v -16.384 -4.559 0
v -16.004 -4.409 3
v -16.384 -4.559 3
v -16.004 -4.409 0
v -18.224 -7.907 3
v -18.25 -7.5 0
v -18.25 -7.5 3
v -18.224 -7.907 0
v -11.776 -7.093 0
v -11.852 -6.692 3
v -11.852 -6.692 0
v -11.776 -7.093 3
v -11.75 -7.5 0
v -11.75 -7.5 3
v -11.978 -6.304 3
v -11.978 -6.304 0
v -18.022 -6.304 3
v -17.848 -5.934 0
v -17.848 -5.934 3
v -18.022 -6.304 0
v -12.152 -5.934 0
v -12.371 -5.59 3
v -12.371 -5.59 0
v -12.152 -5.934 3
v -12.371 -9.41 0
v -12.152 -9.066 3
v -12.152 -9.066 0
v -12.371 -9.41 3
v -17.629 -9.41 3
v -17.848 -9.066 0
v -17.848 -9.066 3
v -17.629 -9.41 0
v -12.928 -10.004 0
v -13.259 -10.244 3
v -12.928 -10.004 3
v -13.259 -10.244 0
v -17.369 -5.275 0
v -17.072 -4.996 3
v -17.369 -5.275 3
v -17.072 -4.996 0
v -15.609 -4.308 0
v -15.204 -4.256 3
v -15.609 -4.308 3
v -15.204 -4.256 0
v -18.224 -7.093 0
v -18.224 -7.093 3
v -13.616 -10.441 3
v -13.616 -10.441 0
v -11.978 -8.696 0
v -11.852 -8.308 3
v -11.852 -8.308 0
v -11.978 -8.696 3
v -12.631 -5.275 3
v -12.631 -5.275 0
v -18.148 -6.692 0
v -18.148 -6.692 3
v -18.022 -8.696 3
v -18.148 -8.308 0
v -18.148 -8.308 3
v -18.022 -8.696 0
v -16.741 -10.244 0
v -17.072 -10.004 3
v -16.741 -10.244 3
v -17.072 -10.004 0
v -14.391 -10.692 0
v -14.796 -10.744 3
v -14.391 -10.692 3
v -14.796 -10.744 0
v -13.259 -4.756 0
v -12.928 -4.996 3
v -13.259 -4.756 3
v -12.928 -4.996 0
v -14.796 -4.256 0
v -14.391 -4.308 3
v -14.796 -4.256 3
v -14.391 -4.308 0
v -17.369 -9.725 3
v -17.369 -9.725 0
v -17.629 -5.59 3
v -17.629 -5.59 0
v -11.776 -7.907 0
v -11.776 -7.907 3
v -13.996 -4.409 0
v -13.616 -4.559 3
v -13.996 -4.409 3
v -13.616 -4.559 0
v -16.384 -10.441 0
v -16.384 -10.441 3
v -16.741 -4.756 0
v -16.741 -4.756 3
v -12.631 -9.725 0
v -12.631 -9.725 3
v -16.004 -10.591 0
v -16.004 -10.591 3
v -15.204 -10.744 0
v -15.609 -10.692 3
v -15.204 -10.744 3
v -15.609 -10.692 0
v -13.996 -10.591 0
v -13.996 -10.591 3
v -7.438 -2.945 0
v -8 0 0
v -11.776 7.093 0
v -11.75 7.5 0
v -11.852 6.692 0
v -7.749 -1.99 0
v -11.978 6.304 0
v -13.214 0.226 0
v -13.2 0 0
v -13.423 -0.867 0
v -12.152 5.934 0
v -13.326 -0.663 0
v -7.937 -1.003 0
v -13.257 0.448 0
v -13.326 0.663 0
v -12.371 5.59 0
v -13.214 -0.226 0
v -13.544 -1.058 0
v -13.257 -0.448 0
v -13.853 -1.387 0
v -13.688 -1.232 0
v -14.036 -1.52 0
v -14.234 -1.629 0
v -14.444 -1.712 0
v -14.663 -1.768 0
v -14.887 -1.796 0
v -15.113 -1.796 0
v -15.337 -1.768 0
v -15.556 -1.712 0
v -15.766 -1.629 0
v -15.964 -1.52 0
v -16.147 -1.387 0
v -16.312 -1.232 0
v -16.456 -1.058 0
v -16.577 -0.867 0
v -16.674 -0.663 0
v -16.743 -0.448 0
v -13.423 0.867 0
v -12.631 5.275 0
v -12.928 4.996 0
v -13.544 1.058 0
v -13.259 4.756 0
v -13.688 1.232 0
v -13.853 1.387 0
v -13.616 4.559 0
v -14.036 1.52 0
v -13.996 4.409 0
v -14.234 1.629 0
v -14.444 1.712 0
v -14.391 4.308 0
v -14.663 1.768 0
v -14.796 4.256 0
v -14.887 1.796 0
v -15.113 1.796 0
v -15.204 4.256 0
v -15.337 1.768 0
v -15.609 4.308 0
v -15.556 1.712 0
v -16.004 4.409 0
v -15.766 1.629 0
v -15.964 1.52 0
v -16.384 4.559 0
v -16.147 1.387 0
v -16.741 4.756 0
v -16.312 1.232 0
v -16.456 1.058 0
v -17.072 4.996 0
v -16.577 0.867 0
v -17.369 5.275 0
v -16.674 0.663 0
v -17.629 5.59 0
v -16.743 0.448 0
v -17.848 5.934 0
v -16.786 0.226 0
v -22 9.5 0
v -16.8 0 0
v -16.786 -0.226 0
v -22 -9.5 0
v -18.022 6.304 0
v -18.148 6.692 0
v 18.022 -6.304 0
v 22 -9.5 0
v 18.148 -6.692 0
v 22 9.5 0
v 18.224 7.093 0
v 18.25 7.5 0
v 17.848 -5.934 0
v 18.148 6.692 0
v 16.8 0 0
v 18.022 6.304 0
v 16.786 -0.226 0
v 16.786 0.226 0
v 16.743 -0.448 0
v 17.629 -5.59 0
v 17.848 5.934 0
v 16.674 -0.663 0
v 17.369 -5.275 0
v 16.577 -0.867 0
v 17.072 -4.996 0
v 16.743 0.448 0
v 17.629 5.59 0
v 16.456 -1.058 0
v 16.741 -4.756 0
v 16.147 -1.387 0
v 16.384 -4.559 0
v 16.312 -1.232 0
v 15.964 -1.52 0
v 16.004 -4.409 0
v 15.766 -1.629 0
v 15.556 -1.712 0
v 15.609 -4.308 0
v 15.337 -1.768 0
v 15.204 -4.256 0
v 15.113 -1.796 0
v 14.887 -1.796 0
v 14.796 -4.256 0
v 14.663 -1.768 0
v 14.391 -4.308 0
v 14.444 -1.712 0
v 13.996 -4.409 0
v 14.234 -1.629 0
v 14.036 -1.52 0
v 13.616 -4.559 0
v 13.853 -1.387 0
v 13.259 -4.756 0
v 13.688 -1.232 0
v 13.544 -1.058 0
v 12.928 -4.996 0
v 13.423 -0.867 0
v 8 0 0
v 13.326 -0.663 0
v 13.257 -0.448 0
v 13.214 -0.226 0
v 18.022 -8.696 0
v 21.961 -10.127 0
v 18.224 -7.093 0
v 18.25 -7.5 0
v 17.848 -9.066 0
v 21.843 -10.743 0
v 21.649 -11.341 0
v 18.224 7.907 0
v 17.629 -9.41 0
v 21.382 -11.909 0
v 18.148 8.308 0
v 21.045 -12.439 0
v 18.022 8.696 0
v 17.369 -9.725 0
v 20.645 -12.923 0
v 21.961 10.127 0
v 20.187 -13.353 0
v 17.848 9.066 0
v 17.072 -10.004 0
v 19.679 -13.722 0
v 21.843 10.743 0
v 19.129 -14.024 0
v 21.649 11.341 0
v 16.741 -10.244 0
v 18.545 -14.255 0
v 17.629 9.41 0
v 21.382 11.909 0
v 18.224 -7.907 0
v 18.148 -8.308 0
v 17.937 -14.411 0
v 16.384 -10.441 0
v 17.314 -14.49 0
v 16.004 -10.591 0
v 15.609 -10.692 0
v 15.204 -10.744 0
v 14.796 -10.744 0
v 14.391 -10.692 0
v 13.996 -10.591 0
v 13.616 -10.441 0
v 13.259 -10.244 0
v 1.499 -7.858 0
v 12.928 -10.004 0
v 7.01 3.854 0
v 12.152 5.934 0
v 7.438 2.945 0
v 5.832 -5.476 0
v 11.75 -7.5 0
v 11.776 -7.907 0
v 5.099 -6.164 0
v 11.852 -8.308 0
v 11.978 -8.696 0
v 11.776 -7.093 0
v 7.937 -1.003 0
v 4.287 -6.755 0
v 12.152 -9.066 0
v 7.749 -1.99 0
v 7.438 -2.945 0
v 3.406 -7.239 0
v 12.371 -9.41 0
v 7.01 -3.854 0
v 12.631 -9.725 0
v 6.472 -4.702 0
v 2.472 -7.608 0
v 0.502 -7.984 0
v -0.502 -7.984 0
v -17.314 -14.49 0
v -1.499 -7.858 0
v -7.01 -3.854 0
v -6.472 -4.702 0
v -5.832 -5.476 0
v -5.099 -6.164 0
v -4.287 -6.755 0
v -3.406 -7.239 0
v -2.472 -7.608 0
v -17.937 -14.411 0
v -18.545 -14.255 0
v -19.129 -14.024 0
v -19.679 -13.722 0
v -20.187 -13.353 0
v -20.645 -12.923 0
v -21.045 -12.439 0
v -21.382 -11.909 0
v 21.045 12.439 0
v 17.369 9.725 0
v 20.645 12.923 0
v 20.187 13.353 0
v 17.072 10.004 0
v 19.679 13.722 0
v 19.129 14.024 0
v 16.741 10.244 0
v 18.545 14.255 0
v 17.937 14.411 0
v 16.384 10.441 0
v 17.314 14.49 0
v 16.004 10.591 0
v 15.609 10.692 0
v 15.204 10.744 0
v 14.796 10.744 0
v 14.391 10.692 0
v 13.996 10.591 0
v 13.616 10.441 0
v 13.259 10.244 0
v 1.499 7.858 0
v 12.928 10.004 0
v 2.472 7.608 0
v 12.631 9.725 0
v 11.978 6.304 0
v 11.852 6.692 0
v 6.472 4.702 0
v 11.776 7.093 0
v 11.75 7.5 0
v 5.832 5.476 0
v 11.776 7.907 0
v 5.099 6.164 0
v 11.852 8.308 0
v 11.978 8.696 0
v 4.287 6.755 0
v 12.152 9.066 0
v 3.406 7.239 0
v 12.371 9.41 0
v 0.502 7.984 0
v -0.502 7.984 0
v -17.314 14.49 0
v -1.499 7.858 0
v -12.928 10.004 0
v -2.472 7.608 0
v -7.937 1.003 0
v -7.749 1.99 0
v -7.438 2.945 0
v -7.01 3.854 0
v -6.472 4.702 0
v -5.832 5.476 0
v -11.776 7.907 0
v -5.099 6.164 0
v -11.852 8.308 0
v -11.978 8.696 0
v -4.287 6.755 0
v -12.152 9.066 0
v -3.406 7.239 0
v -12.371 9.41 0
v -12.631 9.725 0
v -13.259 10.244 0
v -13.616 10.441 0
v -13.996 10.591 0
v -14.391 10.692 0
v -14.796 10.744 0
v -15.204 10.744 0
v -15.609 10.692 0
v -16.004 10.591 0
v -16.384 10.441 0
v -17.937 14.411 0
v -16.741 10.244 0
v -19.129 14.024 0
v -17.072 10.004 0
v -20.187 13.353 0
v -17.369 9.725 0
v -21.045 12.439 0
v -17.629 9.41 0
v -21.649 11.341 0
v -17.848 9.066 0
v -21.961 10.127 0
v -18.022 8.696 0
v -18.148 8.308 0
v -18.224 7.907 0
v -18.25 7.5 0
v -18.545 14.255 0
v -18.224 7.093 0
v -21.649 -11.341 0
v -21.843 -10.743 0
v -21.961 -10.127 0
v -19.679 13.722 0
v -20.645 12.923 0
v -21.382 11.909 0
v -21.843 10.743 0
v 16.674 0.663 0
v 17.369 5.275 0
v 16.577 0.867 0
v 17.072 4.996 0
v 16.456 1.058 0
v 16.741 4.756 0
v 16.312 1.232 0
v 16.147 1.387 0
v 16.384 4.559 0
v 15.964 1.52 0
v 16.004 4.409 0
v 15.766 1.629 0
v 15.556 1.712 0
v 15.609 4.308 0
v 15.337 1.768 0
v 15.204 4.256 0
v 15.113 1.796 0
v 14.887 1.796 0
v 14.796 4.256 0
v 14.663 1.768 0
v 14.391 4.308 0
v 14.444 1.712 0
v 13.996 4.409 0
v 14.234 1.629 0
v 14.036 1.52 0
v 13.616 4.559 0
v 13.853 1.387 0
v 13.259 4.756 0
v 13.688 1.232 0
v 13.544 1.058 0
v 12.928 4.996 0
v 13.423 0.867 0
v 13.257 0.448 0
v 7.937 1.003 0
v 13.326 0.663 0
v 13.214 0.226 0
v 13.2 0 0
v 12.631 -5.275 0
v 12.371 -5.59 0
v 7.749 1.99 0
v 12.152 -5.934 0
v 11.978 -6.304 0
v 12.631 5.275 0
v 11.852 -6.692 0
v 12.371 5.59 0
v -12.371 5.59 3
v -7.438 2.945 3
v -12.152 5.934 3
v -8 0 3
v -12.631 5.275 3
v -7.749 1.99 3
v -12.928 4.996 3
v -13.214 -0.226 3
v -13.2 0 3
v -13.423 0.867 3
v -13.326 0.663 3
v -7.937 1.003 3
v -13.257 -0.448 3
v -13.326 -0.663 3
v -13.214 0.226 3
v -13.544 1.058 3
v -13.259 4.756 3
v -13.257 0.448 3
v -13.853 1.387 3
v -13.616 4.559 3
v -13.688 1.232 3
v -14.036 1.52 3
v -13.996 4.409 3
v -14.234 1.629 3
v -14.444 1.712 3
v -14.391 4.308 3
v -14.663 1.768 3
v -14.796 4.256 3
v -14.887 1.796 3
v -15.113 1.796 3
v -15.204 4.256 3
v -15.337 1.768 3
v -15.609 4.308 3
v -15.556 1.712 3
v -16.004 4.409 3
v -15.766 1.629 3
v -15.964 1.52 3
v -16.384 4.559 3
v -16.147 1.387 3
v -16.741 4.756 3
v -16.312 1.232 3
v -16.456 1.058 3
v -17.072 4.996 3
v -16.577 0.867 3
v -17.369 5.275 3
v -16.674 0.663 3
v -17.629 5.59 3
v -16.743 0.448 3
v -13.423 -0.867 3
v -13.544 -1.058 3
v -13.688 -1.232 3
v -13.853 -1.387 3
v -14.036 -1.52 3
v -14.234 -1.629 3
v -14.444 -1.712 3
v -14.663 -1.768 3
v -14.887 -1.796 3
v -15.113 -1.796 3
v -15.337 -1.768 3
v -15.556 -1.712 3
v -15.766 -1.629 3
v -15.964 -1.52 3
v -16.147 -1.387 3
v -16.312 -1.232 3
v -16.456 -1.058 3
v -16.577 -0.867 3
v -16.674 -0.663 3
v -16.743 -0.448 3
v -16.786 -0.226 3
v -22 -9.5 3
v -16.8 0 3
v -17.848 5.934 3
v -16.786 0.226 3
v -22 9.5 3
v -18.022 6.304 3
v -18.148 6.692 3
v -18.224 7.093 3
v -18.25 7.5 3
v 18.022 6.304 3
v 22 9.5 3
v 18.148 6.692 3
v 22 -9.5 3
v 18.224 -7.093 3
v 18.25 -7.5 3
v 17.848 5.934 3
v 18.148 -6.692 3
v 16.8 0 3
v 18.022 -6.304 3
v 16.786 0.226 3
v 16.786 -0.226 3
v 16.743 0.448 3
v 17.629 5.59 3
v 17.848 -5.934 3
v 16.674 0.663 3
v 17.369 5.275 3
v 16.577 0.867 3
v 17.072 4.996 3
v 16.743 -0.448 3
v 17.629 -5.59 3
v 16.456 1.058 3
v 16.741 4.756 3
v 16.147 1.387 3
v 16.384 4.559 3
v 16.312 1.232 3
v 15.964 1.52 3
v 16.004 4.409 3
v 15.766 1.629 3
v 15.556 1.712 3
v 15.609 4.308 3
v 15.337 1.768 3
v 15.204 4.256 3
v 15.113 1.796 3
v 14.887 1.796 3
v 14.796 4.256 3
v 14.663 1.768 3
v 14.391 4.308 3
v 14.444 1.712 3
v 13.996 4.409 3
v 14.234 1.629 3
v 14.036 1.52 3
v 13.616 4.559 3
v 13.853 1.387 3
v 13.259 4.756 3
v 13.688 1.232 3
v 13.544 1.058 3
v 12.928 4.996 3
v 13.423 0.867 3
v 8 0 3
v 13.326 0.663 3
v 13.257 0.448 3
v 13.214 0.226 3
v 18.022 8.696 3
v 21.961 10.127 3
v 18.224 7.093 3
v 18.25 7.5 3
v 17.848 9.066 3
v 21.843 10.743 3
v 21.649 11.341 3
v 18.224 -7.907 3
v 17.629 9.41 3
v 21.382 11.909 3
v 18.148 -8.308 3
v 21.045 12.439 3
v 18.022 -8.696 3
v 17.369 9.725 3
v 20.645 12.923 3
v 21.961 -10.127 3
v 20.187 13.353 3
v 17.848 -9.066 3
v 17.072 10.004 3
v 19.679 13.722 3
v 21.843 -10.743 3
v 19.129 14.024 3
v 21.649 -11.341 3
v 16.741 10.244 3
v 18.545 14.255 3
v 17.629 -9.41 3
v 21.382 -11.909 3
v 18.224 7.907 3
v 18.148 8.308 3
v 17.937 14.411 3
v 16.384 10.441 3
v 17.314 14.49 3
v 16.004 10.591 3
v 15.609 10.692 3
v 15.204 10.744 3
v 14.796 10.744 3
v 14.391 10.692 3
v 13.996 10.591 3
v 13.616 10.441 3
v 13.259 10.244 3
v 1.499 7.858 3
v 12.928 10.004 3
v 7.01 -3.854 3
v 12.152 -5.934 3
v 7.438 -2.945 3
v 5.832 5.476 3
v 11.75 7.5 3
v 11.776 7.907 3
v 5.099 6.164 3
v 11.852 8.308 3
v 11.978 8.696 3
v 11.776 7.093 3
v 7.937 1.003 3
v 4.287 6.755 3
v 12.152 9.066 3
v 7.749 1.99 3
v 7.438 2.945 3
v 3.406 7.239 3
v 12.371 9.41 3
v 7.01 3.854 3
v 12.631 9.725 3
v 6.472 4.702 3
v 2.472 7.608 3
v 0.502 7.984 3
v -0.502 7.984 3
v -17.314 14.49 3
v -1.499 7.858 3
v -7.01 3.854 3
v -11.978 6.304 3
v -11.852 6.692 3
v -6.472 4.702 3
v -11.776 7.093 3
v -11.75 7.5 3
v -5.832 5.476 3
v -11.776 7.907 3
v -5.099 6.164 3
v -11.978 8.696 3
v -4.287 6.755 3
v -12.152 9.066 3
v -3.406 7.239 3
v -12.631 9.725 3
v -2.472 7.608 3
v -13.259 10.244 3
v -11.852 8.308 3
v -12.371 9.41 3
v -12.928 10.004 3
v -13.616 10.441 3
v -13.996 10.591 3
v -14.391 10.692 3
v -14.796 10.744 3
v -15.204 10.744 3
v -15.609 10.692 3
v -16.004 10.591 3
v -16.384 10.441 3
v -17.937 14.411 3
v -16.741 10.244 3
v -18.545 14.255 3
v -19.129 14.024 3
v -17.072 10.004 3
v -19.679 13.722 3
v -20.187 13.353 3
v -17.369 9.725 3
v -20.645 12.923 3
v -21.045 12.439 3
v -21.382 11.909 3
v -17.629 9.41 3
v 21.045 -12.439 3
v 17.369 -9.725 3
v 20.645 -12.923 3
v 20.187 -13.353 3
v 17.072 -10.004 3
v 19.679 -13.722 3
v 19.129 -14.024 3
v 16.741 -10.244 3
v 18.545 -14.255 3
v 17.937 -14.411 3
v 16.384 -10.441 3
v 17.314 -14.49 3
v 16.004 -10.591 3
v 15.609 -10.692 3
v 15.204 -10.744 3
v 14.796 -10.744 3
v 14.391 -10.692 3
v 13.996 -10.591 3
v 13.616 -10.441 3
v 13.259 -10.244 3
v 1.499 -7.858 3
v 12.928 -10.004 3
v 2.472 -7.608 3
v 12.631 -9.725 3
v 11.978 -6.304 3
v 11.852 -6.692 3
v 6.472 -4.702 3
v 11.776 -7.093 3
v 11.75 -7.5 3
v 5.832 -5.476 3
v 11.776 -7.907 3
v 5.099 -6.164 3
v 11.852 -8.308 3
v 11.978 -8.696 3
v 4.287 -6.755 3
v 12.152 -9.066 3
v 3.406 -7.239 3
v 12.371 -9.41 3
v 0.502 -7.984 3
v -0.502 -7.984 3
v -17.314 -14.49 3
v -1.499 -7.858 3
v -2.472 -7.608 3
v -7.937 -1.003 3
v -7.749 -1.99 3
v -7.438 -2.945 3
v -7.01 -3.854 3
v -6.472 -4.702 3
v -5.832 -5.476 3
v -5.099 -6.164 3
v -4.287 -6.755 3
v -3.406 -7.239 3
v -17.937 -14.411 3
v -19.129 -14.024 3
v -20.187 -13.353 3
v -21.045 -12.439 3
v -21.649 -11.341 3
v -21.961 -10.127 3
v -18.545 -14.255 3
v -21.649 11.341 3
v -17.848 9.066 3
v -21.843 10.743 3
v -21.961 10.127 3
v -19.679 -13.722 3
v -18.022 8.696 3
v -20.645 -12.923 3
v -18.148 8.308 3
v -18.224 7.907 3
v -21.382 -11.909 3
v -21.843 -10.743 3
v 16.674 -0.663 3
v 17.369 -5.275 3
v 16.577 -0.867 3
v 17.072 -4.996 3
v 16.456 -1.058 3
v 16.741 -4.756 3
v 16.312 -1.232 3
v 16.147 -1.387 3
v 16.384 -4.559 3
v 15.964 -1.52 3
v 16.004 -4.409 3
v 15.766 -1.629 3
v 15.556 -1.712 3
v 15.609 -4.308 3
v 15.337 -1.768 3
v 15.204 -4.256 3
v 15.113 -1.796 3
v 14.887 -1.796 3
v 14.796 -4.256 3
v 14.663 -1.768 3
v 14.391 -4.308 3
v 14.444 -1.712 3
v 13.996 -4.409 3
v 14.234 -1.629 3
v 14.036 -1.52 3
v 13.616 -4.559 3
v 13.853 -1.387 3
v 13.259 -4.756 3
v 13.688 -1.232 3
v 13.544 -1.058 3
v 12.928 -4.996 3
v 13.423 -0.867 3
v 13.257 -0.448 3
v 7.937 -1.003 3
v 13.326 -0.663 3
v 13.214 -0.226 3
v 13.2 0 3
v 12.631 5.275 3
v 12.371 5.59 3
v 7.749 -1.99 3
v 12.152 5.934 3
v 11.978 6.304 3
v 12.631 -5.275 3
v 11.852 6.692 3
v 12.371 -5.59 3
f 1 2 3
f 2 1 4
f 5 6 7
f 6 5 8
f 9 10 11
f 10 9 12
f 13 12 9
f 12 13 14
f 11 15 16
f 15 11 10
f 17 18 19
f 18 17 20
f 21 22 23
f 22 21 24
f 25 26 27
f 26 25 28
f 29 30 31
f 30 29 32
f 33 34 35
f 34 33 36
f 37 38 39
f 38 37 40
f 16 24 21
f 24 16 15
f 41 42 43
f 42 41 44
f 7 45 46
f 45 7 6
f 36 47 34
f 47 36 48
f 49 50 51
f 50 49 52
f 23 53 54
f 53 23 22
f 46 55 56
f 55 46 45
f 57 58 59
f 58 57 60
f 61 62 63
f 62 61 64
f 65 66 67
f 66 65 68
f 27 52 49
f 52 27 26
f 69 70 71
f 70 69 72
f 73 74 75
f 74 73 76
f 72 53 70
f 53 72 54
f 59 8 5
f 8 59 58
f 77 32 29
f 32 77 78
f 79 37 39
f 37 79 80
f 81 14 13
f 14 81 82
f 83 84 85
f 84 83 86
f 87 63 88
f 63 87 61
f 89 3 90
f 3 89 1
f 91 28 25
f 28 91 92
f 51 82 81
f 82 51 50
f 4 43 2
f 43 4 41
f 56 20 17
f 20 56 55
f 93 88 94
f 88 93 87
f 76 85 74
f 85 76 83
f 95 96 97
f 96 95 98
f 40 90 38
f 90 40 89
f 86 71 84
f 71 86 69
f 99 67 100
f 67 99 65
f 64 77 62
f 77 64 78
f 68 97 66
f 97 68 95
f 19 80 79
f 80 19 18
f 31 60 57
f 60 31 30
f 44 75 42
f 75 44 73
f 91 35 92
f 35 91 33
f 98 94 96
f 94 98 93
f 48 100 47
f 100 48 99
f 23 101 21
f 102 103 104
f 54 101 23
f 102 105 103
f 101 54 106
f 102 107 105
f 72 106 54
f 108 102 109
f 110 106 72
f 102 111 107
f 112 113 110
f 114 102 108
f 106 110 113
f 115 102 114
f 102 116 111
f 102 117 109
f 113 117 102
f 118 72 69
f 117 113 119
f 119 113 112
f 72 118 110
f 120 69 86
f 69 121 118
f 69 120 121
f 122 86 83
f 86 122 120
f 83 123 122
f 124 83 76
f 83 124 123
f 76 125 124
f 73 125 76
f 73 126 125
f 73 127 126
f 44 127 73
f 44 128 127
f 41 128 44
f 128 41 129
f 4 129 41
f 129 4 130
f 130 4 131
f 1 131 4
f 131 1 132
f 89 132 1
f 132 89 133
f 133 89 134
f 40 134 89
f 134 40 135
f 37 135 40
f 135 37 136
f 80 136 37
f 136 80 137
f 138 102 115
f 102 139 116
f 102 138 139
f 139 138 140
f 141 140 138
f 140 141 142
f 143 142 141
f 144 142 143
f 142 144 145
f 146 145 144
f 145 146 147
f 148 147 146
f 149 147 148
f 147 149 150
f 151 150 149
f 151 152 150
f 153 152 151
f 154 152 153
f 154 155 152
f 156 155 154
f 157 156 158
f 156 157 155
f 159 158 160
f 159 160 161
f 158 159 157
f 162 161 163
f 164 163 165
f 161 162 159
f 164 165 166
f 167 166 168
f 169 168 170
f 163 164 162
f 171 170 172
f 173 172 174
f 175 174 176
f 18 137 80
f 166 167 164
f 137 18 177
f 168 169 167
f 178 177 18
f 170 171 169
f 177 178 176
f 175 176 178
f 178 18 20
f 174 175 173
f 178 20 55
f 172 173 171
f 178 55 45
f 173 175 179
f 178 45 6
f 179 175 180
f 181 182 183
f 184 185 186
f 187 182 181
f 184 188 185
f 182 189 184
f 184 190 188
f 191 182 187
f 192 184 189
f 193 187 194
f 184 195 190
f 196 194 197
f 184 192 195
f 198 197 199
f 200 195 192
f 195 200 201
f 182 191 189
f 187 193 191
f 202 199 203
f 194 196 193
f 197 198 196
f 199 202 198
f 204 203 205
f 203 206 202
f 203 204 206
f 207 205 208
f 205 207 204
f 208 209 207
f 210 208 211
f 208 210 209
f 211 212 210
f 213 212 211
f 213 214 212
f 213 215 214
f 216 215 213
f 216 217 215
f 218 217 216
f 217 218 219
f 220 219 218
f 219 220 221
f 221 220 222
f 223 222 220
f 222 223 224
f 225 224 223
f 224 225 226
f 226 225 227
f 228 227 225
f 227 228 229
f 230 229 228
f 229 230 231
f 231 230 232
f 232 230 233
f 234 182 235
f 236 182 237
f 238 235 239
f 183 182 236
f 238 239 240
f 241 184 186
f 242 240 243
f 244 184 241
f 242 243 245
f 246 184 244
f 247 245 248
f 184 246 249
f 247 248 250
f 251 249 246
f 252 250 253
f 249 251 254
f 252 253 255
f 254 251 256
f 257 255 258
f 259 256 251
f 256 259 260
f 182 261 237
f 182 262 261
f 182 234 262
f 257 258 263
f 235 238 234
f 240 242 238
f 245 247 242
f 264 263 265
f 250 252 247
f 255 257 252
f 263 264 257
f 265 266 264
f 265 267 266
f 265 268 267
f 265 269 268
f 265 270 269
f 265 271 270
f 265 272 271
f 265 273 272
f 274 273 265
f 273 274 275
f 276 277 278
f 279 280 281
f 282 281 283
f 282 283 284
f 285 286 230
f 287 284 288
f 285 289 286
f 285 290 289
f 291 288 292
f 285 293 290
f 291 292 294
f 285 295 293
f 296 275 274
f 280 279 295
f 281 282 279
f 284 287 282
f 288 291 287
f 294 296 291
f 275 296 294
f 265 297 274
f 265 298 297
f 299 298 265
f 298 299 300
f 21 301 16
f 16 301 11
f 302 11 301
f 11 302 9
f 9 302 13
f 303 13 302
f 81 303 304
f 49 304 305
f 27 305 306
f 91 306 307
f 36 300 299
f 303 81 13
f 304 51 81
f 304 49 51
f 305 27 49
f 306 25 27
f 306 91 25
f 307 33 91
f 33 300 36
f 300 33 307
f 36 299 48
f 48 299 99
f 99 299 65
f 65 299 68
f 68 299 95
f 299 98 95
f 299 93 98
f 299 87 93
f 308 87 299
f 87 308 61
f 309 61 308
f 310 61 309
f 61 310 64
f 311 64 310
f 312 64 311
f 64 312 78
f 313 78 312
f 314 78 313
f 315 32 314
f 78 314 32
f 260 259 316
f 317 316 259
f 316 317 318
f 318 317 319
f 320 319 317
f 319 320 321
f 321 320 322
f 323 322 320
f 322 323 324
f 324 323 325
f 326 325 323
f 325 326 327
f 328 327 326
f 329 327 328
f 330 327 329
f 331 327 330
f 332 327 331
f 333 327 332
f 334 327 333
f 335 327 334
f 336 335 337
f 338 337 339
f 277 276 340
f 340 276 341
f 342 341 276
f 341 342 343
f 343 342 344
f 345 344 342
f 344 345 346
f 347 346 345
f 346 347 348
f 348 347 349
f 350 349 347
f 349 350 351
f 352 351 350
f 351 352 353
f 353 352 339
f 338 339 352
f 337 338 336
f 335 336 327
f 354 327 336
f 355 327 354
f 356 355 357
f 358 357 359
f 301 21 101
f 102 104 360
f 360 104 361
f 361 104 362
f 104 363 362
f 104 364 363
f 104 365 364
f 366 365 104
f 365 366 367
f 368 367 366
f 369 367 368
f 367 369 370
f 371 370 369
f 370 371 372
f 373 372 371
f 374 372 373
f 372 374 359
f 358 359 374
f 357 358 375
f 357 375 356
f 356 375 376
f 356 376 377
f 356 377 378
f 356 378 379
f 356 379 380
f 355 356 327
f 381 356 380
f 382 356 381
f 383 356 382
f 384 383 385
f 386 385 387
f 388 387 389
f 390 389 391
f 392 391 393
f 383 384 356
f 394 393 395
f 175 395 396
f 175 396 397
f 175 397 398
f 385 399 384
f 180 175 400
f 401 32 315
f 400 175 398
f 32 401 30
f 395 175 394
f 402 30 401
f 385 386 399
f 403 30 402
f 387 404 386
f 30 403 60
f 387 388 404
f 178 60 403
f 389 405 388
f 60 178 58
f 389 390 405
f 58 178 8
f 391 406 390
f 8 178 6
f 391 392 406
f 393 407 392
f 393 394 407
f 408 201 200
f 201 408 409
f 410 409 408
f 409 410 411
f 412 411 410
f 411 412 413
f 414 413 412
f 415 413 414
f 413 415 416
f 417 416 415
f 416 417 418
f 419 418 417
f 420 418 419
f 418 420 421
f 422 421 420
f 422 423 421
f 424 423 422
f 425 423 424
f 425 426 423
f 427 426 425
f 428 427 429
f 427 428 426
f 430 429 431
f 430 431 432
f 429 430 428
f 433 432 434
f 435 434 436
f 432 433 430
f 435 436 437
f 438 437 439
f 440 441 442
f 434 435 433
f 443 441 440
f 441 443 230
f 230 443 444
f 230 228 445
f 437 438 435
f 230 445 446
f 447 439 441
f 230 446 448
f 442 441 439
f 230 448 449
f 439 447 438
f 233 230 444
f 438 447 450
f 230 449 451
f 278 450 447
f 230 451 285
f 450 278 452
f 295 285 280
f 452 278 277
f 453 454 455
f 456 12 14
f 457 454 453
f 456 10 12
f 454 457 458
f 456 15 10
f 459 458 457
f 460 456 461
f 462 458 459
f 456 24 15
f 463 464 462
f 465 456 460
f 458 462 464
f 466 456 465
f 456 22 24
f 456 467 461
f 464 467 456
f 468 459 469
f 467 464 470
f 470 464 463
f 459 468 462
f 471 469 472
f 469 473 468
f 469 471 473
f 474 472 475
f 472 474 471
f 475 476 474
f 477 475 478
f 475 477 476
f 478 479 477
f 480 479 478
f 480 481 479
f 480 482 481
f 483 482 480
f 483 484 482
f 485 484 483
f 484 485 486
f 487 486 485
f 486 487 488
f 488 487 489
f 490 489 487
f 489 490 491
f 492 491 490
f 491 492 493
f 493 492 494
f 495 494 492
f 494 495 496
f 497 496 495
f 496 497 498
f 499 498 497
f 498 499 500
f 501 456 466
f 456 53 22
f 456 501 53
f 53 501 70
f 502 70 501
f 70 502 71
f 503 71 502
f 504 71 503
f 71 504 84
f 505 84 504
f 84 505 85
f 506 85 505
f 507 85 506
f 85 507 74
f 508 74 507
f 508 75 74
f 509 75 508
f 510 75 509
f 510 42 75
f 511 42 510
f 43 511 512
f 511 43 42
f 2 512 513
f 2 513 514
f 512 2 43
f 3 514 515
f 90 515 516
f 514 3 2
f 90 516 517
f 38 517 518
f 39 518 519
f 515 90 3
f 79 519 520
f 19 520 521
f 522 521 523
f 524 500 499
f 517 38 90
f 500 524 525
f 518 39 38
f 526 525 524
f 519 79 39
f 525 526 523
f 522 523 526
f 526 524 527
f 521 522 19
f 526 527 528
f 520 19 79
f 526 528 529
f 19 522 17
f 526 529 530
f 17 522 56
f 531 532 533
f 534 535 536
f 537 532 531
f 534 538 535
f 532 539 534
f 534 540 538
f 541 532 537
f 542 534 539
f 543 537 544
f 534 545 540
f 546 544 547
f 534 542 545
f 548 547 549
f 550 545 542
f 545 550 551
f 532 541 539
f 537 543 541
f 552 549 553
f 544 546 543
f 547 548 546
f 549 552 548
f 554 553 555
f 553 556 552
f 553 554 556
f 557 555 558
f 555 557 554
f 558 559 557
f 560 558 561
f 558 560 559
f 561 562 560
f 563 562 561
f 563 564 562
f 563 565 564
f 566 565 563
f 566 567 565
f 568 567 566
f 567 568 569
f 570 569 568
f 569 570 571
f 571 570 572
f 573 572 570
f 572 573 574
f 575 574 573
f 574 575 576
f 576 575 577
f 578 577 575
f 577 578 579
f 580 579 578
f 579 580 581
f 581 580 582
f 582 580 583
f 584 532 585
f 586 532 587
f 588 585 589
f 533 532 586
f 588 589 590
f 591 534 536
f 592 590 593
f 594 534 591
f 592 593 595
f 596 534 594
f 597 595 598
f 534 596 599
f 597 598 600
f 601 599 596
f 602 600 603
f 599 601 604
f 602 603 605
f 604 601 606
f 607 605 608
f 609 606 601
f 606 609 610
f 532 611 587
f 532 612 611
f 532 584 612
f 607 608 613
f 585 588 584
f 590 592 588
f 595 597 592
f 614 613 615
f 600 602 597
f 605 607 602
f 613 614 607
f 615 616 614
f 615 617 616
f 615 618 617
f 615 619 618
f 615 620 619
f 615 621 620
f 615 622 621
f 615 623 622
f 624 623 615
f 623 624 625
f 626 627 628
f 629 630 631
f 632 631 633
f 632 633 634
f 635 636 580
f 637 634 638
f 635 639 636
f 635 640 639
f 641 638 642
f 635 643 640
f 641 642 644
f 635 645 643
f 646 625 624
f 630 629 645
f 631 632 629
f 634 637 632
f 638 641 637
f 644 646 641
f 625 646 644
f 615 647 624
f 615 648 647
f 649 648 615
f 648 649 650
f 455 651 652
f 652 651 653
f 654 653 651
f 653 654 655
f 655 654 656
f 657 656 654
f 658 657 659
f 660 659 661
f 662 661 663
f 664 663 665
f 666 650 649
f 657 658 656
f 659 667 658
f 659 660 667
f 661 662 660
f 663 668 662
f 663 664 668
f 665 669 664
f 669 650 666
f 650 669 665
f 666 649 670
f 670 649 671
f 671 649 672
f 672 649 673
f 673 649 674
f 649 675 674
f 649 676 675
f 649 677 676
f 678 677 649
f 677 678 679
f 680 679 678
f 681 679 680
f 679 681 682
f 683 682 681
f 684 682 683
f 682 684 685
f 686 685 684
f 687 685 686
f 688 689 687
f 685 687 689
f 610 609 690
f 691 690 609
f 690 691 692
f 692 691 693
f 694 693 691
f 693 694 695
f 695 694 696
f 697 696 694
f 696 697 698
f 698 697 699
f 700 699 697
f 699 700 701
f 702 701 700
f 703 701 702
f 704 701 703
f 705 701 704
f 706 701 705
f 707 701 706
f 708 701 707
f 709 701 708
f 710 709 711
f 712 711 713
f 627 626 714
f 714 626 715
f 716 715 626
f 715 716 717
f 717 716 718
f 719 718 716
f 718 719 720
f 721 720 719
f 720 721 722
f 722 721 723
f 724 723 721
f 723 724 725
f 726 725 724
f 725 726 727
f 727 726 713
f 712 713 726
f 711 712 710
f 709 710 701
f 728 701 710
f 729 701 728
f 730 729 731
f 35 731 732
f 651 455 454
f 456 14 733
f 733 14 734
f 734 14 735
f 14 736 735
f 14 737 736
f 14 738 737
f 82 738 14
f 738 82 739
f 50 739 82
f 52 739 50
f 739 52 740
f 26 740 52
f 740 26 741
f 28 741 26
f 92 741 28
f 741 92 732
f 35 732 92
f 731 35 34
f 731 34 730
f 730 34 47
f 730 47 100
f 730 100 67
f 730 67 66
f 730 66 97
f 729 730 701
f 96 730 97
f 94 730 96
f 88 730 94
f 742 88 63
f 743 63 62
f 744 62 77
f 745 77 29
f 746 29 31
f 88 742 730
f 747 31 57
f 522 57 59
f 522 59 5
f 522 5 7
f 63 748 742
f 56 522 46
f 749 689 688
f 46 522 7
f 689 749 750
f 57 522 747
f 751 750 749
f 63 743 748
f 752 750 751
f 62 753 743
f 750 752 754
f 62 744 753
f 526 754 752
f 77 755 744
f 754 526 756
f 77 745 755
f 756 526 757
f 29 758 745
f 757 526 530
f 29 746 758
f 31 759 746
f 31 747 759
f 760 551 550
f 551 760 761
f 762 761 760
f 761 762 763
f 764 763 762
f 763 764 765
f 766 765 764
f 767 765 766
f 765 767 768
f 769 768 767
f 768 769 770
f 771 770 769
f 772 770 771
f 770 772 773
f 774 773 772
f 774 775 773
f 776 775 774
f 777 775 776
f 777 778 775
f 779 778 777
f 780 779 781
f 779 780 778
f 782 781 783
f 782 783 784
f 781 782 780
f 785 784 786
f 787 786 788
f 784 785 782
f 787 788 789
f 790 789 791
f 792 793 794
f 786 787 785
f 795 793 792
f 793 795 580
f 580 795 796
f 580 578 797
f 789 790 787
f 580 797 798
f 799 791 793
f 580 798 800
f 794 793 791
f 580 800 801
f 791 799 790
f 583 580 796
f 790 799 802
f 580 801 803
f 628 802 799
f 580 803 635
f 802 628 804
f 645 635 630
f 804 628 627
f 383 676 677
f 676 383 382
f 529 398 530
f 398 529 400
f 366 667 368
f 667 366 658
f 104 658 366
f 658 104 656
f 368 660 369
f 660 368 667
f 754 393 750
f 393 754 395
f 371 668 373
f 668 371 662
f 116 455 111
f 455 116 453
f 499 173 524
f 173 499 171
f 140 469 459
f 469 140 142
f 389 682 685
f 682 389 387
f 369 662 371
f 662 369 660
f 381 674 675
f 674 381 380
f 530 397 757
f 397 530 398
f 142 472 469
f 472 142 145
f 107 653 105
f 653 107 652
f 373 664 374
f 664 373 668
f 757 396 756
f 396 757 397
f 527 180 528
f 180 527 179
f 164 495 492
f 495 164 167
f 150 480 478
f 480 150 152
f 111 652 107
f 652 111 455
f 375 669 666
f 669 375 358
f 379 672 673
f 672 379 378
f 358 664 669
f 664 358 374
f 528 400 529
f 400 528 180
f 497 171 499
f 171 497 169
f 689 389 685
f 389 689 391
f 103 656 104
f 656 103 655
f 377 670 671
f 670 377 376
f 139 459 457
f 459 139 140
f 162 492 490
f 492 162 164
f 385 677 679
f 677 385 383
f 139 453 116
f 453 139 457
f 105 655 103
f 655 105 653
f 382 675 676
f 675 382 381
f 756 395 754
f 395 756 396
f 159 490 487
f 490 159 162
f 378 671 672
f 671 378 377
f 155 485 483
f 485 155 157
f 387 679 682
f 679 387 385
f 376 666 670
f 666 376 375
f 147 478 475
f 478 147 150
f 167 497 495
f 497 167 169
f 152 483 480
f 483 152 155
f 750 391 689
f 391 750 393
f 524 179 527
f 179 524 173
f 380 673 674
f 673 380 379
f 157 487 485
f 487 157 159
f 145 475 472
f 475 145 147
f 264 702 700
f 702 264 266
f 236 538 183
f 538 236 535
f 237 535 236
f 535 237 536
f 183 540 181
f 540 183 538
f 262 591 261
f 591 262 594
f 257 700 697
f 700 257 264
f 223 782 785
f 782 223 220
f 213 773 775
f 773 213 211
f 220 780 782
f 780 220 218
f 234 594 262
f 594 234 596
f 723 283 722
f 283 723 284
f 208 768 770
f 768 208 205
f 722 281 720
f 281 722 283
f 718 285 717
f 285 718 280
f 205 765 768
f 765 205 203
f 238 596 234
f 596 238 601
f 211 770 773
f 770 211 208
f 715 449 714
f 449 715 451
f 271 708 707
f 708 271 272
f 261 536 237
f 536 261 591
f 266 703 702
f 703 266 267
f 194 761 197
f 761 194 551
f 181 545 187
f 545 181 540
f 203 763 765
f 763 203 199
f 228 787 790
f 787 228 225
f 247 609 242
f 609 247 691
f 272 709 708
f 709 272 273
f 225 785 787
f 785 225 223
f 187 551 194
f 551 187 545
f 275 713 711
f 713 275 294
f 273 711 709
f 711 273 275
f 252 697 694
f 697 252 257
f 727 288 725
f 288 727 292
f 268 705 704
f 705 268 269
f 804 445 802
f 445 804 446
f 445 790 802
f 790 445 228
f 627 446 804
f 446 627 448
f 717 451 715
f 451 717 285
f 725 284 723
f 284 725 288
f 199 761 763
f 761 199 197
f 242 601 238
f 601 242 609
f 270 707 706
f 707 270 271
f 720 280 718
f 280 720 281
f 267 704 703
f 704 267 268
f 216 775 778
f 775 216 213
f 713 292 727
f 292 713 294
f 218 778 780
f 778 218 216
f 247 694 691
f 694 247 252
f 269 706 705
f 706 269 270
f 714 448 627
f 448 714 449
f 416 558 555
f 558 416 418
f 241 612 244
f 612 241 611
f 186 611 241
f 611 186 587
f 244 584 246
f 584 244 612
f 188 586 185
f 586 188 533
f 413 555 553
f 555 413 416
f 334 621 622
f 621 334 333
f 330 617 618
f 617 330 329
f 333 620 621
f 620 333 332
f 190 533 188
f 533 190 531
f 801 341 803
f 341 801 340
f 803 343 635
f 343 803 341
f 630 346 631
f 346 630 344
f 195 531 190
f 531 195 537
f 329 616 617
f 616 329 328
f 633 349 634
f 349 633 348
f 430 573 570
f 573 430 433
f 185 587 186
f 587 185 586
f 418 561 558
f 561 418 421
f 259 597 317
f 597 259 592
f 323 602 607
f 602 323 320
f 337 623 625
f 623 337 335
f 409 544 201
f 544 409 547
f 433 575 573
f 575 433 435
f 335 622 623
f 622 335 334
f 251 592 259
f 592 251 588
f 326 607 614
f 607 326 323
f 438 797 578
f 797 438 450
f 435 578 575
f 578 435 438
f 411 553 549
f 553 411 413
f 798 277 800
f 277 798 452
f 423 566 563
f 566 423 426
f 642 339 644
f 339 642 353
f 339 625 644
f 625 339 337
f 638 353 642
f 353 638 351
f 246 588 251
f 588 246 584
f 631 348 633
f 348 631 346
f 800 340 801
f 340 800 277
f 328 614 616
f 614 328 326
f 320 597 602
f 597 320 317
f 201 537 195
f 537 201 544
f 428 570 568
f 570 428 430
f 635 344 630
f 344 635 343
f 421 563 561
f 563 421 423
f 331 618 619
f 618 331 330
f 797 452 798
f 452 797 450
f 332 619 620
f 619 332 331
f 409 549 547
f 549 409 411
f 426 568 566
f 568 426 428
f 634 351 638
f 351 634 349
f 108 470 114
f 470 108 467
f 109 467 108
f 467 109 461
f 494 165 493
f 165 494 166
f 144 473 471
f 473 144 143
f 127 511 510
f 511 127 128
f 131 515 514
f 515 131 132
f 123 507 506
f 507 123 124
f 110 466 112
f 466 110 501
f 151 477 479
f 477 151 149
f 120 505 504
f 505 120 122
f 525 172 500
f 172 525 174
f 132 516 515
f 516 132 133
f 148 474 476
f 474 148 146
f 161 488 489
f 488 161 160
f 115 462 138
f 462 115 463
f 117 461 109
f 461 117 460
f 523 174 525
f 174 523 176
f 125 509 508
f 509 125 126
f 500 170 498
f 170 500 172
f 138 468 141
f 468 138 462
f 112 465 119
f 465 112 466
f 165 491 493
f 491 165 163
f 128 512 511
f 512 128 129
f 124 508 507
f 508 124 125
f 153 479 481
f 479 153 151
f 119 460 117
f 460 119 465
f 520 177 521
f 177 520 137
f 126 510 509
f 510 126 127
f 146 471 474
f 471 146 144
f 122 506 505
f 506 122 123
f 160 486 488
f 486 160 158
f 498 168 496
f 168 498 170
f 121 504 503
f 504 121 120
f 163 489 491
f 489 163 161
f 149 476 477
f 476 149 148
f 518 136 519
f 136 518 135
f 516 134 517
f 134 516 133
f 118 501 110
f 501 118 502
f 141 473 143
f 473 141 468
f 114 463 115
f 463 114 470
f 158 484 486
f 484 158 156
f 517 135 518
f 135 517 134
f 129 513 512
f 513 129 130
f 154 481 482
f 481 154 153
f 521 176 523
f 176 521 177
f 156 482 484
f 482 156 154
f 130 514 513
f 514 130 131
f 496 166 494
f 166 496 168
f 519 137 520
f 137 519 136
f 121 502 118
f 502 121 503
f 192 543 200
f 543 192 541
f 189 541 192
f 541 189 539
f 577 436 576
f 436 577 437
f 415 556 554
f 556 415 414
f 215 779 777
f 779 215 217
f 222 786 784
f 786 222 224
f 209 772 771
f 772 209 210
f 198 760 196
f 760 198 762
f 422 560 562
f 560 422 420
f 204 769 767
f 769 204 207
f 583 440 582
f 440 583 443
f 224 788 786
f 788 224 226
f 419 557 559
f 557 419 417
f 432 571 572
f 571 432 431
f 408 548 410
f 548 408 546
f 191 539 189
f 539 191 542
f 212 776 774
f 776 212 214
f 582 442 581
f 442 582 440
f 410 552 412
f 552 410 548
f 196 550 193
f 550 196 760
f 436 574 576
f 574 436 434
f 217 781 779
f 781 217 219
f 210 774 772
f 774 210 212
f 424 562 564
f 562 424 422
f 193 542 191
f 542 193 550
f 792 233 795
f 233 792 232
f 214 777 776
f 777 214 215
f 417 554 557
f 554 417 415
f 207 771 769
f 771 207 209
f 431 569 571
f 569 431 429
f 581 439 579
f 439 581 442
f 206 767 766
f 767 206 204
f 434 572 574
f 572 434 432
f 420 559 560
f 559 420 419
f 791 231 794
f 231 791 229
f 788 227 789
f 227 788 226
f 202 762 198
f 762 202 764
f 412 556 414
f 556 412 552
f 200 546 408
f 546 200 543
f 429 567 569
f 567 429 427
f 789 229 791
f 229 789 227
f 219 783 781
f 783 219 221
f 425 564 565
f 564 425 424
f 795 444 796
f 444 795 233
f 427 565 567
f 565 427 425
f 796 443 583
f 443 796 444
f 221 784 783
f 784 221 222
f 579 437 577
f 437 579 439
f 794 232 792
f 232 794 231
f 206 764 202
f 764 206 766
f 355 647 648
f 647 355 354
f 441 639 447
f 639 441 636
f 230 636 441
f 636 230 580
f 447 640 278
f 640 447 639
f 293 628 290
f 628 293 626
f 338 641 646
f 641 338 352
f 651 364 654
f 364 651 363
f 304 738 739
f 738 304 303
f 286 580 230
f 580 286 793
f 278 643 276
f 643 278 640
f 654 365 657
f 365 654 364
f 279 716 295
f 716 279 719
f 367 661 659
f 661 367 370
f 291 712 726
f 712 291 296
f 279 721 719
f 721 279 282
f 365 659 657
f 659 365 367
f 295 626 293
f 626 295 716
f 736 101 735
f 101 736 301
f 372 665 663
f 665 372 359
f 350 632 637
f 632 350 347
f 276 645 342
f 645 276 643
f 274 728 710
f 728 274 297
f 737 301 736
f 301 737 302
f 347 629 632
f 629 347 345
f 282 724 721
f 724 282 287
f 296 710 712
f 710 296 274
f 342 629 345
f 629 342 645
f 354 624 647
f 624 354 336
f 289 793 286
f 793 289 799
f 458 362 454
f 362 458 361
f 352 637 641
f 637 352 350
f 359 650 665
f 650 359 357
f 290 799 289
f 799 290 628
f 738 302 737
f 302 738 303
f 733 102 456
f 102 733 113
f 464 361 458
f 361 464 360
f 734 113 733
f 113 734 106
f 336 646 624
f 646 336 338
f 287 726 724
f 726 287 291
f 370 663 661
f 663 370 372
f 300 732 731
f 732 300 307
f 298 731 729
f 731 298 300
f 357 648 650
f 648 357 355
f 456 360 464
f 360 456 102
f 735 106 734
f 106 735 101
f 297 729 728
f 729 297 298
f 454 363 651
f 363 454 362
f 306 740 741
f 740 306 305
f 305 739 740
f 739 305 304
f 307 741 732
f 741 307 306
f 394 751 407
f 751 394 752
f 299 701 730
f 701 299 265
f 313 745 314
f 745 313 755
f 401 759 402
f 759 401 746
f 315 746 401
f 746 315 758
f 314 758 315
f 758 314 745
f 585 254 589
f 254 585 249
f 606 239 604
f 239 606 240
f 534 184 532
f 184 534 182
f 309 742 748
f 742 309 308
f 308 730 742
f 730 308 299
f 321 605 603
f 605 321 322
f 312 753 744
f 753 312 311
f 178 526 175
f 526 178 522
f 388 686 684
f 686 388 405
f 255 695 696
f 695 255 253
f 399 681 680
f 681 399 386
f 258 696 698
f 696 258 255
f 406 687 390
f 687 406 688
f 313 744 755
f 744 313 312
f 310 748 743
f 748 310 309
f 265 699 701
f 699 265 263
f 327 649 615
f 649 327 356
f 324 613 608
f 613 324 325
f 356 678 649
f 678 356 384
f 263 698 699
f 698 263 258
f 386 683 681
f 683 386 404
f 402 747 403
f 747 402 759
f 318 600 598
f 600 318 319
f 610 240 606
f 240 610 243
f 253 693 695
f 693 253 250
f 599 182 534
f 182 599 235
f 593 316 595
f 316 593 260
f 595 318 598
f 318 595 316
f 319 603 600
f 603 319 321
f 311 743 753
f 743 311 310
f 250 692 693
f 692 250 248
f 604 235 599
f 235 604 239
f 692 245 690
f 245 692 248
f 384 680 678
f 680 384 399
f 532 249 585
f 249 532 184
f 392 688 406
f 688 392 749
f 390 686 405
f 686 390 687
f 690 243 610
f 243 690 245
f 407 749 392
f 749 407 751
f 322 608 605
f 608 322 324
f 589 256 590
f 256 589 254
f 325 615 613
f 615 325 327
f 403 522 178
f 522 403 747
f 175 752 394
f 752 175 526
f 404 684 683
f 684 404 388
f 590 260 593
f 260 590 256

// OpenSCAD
$fn = 50;

difference() {
	union() {
		hull() {
			translate(v = [-17.0, 9.5, 0]) {
				cylinder(h = 3, r = 5);
			}
			translate(v = [17.0, 9.5, 0]) {
				cylinder(h = 3, r = 5);
			}
			translate(v = [-17.0, -9.5, 0]) {
				cylinder(h = 3, r = 5);
			}
			translate(v = [17.0, -9.5, 0]) {
				cylinder(h = 3, r = 5);
			}
		}
	}
	union() {
		translate(v = [-15.0, -7.5, 0]) {
			cylinder(h = 3, r = 3.25);
		}
		translate(v = [-15.0, 7.5, 0]) {
			cylinder(h = 3, r = 3.25);
		}
		translate(v = [15.0, -7.5, 0]) {
			cylinder(h = 3, r = 3.25);
		}
		translate(v = [15.0, 7.5, 0]) {
			cylinder(h = 3, r = 3.25);
		}
		translate(v = [-15.0, 0.0, 0]) {
			cylinder(h = 3, r = 1.8);
		}
		translate(v = [15.0, 0.0, 0]) {
			cylinder(h = 3, r = 1.8);
		}
		cylinder(h = 3, r = 8.0);
	}
}
